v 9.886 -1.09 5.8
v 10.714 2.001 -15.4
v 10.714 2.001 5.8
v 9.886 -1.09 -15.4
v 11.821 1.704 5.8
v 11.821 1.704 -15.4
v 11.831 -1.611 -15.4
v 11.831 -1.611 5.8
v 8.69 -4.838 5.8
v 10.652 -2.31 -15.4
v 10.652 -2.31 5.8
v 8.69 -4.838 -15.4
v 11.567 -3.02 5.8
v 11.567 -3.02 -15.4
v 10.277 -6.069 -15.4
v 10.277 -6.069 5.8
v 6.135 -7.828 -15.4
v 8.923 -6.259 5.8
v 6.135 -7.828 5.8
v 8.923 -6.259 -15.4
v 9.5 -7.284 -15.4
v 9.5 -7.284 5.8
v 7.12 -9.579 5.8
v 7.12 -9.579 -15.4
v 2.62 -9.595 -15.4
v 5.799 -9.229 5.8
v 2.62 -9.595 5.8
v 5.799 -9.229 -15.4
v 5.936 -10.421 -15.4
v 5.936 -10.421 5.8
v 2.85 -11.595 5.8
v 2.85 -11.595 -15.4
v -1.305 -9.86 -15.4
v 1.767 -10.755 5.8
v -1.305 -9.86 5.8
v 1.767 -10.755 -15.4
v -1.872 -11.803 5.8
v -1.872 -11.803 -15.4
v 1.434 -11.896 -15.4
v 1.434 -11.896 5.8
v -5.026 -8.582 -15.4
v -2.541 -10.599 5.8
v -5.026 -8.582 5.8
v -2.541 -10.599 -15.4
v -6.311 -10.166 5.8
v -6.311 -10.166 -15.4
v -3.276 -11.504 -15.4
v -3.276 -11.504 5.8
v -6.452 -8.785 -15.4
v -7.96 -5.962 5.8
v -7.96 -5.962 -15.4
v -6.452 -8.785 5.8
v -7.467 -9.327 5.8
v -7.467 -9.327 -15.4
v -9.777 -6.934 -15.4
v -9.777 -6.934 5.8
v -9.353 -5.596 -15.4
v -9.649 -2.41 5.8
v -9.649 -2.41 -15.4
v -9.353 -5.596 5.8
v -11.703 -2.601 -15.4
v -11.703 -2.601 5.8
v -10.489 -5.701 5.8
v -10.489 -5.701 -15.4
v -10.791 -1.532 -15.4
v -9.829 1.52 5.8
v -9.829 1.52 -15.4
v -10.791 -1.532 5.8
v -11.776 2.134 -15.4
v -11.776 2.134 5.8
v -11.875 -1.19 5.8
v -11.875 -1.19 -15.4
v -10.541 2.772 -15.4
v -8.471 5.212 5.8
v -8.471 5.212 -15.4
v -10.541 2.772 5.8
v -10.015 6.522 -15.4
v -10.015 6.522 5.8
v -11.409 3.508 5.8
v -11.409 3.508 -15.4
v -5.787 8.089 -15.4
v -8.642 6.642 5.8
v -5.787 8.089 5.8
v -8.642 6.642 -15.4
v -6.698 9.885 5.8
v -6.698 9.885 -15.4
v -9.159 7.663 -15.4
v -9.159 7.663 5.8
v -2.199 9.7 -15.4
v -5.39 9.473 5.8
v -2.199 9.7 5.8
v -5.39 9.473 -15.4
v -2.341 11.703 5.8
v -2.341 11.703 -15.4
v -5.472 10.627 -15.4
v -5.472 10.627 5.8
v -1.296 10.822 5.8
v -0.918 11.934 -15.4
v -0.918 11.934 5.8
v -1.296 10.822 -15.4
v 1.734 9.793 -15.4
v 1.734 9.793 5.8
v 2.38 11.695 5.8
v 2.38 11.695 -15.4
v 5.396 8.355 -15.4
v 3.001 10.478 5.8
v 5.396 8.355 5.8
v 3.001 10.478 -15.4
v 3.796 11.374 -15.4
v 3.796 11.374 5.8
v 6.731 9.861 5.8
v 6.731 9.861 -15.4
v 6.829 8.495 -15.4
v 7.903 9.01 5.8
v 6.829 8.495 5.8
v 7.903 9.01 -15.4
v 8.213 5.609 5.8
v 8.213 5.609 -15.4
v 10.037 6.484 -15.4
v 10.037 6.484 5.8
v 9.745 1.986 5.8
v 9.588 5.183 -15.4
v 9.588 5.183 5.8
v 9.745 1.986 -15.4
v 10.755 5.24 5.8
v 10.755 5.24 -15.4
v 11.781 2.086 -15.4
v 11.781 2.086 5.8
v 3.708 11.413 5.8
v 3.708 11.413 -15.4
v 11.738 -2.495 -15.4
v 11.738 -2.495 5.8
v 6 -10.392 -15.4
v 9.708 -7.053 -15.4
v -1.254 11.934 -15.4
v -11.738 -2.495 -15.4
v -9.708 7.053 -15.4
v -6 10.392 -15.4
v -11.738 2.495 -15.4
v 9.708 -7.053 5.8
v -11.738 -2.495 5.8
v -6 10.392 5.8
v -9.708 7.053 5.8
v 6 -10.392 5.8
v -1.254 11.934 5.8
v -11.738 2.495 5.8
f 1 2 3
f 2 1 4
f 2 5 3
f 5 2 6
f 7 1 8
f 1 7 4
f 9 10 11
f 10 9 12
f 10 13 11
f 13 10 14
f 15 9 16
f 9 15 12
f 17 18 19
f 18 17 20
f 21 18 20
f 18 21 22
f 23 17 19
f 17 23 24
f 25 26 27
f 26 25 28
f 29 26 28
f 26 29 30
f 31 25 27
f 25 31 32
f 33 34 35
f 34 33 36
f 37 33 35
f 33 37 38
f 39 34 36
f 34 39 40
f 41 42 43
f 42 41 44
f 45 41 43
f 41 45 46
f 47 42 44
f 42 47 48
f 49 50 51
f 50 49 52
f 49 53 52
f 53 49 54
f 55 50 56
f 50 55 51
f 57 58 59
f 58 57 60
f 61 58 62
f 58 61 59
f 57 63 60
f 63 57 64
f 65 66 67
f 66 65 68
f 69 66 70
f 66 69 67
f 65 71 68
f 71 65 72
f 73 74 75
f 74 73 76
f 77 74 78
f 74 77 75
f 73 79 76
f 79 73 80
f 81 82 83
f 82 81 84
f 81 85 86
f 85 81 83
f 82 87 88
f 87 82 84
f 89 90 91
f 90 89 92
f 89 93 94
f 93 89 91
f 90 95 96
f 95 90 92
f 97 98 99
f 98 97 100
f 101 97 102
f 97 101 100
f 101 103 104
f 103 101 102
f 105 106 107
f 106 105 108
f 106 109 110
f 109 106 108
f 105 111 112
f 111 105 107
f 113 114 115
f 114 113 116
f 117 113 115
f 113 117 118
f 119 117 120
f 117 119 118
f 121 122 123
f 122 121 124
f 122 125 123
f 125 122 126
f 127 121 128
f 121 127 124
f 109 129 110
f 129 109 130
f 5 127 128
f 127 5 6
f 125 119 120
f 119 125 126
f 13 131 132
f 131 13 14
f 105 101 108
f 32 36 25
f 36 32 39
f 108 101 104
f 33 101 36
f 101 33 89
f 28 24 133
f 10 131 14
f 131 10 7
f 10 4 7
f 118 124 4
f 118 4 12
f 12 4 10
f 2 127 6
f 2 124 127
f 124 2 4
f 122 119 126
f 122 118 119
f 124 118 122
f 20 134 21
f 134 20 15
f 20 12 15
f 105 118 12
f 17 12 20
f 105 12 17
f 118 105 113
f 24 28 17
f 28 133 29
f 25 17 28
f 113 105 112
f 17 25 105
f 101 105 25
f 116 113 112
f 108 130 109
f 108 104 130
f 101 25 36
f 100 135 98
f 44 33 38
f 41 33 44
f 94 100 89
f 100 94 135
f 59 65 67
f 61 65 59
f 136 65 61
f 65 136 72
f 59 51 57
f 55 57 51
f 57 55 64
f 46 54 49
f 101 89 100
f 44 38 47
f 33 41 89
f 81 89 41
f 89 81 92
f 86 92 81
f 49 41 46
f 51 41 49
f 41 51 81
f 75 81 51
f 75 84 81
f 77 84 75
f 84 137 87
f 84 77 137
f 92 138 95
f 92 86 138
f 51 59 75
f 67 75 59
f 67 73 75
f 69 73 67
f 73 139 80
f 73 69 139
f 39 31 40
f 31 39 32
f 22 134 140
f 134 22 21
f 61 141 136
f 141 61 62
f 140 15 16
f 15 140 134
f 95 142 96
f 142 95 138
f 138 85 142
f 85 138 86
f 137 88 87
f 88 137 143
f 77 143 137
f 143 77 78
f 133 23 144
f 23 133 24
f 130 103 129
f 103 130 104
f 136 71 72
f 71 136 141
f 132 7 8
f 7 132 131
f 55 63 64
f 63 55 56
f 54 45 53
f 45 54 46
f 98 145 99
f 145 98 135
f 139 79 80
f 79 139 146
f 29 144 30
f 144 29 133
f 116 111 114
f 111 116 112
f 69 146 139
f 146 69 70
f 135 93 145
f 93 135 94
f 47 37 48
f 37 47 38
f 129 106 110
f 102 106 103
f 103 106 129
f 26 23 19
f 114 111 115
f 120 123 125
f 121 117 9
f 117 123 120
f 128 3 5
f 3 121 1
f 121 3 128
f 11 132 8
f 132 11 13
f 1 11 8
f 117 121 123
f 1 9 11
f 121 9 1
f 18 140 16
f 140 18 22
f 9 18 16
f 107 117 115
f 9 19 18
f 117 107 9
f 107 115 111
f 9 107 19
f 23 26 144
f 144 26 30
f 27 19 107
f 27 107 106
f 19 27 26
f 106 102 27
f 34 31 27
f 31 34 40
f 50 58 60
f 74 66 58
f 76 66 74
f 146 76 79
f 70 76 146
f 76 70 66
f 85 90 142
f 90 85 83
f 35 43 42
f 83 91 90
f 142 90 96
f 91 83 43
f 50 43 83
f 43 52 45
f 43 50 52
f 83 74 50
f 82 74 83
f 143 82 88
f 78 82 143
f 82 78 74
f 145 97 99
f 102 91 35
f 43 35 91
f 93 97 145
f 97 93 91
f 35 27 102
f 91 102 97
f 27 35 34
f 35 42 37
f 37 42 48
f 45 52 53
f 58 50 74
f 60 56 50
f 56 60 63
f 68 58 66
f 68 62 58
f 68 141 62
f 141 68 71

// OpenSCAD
size = 32;//block=32 //item=8

count = 16;
segments = 12;

//%cube([size*1,size*1,size*1],center=true);	//refrence cube

module segment(diamater = size * 1) {
  difference() {
    cylinder(h = size * 0.125 * 0.5, d = diamater, center = true);
    union() {
      for(i = [0:1:count - 1]) {
        rotate([365 / count * i, 90, 0]) {
          translate([0, 0, diamater * 0.5]) {
            rotate([15, 0, 0]) {
              cube([size * 0.1, size * 0.1, size * 0.11], center = true);
            }
            ;//rotate
          }
          ;//translate
        }
        ;//rotate
      }
      ;//for
    }
    ;//union
  }
  ;//difference
}
;//segment

difference() {
  translate([0, 0, -(size * 0.05 * segments) * 0.75]) {
    for(i = [0:1:segments]) {
      translate([0, 0, size * 0.05 * i]) {
        segment(size * (0.75));
      }
      ;//translate
    }
    ;//for
  }
  ;//translate
  %cylinder(h = size, d = size * (0.5), center = true);
}
;//difference
